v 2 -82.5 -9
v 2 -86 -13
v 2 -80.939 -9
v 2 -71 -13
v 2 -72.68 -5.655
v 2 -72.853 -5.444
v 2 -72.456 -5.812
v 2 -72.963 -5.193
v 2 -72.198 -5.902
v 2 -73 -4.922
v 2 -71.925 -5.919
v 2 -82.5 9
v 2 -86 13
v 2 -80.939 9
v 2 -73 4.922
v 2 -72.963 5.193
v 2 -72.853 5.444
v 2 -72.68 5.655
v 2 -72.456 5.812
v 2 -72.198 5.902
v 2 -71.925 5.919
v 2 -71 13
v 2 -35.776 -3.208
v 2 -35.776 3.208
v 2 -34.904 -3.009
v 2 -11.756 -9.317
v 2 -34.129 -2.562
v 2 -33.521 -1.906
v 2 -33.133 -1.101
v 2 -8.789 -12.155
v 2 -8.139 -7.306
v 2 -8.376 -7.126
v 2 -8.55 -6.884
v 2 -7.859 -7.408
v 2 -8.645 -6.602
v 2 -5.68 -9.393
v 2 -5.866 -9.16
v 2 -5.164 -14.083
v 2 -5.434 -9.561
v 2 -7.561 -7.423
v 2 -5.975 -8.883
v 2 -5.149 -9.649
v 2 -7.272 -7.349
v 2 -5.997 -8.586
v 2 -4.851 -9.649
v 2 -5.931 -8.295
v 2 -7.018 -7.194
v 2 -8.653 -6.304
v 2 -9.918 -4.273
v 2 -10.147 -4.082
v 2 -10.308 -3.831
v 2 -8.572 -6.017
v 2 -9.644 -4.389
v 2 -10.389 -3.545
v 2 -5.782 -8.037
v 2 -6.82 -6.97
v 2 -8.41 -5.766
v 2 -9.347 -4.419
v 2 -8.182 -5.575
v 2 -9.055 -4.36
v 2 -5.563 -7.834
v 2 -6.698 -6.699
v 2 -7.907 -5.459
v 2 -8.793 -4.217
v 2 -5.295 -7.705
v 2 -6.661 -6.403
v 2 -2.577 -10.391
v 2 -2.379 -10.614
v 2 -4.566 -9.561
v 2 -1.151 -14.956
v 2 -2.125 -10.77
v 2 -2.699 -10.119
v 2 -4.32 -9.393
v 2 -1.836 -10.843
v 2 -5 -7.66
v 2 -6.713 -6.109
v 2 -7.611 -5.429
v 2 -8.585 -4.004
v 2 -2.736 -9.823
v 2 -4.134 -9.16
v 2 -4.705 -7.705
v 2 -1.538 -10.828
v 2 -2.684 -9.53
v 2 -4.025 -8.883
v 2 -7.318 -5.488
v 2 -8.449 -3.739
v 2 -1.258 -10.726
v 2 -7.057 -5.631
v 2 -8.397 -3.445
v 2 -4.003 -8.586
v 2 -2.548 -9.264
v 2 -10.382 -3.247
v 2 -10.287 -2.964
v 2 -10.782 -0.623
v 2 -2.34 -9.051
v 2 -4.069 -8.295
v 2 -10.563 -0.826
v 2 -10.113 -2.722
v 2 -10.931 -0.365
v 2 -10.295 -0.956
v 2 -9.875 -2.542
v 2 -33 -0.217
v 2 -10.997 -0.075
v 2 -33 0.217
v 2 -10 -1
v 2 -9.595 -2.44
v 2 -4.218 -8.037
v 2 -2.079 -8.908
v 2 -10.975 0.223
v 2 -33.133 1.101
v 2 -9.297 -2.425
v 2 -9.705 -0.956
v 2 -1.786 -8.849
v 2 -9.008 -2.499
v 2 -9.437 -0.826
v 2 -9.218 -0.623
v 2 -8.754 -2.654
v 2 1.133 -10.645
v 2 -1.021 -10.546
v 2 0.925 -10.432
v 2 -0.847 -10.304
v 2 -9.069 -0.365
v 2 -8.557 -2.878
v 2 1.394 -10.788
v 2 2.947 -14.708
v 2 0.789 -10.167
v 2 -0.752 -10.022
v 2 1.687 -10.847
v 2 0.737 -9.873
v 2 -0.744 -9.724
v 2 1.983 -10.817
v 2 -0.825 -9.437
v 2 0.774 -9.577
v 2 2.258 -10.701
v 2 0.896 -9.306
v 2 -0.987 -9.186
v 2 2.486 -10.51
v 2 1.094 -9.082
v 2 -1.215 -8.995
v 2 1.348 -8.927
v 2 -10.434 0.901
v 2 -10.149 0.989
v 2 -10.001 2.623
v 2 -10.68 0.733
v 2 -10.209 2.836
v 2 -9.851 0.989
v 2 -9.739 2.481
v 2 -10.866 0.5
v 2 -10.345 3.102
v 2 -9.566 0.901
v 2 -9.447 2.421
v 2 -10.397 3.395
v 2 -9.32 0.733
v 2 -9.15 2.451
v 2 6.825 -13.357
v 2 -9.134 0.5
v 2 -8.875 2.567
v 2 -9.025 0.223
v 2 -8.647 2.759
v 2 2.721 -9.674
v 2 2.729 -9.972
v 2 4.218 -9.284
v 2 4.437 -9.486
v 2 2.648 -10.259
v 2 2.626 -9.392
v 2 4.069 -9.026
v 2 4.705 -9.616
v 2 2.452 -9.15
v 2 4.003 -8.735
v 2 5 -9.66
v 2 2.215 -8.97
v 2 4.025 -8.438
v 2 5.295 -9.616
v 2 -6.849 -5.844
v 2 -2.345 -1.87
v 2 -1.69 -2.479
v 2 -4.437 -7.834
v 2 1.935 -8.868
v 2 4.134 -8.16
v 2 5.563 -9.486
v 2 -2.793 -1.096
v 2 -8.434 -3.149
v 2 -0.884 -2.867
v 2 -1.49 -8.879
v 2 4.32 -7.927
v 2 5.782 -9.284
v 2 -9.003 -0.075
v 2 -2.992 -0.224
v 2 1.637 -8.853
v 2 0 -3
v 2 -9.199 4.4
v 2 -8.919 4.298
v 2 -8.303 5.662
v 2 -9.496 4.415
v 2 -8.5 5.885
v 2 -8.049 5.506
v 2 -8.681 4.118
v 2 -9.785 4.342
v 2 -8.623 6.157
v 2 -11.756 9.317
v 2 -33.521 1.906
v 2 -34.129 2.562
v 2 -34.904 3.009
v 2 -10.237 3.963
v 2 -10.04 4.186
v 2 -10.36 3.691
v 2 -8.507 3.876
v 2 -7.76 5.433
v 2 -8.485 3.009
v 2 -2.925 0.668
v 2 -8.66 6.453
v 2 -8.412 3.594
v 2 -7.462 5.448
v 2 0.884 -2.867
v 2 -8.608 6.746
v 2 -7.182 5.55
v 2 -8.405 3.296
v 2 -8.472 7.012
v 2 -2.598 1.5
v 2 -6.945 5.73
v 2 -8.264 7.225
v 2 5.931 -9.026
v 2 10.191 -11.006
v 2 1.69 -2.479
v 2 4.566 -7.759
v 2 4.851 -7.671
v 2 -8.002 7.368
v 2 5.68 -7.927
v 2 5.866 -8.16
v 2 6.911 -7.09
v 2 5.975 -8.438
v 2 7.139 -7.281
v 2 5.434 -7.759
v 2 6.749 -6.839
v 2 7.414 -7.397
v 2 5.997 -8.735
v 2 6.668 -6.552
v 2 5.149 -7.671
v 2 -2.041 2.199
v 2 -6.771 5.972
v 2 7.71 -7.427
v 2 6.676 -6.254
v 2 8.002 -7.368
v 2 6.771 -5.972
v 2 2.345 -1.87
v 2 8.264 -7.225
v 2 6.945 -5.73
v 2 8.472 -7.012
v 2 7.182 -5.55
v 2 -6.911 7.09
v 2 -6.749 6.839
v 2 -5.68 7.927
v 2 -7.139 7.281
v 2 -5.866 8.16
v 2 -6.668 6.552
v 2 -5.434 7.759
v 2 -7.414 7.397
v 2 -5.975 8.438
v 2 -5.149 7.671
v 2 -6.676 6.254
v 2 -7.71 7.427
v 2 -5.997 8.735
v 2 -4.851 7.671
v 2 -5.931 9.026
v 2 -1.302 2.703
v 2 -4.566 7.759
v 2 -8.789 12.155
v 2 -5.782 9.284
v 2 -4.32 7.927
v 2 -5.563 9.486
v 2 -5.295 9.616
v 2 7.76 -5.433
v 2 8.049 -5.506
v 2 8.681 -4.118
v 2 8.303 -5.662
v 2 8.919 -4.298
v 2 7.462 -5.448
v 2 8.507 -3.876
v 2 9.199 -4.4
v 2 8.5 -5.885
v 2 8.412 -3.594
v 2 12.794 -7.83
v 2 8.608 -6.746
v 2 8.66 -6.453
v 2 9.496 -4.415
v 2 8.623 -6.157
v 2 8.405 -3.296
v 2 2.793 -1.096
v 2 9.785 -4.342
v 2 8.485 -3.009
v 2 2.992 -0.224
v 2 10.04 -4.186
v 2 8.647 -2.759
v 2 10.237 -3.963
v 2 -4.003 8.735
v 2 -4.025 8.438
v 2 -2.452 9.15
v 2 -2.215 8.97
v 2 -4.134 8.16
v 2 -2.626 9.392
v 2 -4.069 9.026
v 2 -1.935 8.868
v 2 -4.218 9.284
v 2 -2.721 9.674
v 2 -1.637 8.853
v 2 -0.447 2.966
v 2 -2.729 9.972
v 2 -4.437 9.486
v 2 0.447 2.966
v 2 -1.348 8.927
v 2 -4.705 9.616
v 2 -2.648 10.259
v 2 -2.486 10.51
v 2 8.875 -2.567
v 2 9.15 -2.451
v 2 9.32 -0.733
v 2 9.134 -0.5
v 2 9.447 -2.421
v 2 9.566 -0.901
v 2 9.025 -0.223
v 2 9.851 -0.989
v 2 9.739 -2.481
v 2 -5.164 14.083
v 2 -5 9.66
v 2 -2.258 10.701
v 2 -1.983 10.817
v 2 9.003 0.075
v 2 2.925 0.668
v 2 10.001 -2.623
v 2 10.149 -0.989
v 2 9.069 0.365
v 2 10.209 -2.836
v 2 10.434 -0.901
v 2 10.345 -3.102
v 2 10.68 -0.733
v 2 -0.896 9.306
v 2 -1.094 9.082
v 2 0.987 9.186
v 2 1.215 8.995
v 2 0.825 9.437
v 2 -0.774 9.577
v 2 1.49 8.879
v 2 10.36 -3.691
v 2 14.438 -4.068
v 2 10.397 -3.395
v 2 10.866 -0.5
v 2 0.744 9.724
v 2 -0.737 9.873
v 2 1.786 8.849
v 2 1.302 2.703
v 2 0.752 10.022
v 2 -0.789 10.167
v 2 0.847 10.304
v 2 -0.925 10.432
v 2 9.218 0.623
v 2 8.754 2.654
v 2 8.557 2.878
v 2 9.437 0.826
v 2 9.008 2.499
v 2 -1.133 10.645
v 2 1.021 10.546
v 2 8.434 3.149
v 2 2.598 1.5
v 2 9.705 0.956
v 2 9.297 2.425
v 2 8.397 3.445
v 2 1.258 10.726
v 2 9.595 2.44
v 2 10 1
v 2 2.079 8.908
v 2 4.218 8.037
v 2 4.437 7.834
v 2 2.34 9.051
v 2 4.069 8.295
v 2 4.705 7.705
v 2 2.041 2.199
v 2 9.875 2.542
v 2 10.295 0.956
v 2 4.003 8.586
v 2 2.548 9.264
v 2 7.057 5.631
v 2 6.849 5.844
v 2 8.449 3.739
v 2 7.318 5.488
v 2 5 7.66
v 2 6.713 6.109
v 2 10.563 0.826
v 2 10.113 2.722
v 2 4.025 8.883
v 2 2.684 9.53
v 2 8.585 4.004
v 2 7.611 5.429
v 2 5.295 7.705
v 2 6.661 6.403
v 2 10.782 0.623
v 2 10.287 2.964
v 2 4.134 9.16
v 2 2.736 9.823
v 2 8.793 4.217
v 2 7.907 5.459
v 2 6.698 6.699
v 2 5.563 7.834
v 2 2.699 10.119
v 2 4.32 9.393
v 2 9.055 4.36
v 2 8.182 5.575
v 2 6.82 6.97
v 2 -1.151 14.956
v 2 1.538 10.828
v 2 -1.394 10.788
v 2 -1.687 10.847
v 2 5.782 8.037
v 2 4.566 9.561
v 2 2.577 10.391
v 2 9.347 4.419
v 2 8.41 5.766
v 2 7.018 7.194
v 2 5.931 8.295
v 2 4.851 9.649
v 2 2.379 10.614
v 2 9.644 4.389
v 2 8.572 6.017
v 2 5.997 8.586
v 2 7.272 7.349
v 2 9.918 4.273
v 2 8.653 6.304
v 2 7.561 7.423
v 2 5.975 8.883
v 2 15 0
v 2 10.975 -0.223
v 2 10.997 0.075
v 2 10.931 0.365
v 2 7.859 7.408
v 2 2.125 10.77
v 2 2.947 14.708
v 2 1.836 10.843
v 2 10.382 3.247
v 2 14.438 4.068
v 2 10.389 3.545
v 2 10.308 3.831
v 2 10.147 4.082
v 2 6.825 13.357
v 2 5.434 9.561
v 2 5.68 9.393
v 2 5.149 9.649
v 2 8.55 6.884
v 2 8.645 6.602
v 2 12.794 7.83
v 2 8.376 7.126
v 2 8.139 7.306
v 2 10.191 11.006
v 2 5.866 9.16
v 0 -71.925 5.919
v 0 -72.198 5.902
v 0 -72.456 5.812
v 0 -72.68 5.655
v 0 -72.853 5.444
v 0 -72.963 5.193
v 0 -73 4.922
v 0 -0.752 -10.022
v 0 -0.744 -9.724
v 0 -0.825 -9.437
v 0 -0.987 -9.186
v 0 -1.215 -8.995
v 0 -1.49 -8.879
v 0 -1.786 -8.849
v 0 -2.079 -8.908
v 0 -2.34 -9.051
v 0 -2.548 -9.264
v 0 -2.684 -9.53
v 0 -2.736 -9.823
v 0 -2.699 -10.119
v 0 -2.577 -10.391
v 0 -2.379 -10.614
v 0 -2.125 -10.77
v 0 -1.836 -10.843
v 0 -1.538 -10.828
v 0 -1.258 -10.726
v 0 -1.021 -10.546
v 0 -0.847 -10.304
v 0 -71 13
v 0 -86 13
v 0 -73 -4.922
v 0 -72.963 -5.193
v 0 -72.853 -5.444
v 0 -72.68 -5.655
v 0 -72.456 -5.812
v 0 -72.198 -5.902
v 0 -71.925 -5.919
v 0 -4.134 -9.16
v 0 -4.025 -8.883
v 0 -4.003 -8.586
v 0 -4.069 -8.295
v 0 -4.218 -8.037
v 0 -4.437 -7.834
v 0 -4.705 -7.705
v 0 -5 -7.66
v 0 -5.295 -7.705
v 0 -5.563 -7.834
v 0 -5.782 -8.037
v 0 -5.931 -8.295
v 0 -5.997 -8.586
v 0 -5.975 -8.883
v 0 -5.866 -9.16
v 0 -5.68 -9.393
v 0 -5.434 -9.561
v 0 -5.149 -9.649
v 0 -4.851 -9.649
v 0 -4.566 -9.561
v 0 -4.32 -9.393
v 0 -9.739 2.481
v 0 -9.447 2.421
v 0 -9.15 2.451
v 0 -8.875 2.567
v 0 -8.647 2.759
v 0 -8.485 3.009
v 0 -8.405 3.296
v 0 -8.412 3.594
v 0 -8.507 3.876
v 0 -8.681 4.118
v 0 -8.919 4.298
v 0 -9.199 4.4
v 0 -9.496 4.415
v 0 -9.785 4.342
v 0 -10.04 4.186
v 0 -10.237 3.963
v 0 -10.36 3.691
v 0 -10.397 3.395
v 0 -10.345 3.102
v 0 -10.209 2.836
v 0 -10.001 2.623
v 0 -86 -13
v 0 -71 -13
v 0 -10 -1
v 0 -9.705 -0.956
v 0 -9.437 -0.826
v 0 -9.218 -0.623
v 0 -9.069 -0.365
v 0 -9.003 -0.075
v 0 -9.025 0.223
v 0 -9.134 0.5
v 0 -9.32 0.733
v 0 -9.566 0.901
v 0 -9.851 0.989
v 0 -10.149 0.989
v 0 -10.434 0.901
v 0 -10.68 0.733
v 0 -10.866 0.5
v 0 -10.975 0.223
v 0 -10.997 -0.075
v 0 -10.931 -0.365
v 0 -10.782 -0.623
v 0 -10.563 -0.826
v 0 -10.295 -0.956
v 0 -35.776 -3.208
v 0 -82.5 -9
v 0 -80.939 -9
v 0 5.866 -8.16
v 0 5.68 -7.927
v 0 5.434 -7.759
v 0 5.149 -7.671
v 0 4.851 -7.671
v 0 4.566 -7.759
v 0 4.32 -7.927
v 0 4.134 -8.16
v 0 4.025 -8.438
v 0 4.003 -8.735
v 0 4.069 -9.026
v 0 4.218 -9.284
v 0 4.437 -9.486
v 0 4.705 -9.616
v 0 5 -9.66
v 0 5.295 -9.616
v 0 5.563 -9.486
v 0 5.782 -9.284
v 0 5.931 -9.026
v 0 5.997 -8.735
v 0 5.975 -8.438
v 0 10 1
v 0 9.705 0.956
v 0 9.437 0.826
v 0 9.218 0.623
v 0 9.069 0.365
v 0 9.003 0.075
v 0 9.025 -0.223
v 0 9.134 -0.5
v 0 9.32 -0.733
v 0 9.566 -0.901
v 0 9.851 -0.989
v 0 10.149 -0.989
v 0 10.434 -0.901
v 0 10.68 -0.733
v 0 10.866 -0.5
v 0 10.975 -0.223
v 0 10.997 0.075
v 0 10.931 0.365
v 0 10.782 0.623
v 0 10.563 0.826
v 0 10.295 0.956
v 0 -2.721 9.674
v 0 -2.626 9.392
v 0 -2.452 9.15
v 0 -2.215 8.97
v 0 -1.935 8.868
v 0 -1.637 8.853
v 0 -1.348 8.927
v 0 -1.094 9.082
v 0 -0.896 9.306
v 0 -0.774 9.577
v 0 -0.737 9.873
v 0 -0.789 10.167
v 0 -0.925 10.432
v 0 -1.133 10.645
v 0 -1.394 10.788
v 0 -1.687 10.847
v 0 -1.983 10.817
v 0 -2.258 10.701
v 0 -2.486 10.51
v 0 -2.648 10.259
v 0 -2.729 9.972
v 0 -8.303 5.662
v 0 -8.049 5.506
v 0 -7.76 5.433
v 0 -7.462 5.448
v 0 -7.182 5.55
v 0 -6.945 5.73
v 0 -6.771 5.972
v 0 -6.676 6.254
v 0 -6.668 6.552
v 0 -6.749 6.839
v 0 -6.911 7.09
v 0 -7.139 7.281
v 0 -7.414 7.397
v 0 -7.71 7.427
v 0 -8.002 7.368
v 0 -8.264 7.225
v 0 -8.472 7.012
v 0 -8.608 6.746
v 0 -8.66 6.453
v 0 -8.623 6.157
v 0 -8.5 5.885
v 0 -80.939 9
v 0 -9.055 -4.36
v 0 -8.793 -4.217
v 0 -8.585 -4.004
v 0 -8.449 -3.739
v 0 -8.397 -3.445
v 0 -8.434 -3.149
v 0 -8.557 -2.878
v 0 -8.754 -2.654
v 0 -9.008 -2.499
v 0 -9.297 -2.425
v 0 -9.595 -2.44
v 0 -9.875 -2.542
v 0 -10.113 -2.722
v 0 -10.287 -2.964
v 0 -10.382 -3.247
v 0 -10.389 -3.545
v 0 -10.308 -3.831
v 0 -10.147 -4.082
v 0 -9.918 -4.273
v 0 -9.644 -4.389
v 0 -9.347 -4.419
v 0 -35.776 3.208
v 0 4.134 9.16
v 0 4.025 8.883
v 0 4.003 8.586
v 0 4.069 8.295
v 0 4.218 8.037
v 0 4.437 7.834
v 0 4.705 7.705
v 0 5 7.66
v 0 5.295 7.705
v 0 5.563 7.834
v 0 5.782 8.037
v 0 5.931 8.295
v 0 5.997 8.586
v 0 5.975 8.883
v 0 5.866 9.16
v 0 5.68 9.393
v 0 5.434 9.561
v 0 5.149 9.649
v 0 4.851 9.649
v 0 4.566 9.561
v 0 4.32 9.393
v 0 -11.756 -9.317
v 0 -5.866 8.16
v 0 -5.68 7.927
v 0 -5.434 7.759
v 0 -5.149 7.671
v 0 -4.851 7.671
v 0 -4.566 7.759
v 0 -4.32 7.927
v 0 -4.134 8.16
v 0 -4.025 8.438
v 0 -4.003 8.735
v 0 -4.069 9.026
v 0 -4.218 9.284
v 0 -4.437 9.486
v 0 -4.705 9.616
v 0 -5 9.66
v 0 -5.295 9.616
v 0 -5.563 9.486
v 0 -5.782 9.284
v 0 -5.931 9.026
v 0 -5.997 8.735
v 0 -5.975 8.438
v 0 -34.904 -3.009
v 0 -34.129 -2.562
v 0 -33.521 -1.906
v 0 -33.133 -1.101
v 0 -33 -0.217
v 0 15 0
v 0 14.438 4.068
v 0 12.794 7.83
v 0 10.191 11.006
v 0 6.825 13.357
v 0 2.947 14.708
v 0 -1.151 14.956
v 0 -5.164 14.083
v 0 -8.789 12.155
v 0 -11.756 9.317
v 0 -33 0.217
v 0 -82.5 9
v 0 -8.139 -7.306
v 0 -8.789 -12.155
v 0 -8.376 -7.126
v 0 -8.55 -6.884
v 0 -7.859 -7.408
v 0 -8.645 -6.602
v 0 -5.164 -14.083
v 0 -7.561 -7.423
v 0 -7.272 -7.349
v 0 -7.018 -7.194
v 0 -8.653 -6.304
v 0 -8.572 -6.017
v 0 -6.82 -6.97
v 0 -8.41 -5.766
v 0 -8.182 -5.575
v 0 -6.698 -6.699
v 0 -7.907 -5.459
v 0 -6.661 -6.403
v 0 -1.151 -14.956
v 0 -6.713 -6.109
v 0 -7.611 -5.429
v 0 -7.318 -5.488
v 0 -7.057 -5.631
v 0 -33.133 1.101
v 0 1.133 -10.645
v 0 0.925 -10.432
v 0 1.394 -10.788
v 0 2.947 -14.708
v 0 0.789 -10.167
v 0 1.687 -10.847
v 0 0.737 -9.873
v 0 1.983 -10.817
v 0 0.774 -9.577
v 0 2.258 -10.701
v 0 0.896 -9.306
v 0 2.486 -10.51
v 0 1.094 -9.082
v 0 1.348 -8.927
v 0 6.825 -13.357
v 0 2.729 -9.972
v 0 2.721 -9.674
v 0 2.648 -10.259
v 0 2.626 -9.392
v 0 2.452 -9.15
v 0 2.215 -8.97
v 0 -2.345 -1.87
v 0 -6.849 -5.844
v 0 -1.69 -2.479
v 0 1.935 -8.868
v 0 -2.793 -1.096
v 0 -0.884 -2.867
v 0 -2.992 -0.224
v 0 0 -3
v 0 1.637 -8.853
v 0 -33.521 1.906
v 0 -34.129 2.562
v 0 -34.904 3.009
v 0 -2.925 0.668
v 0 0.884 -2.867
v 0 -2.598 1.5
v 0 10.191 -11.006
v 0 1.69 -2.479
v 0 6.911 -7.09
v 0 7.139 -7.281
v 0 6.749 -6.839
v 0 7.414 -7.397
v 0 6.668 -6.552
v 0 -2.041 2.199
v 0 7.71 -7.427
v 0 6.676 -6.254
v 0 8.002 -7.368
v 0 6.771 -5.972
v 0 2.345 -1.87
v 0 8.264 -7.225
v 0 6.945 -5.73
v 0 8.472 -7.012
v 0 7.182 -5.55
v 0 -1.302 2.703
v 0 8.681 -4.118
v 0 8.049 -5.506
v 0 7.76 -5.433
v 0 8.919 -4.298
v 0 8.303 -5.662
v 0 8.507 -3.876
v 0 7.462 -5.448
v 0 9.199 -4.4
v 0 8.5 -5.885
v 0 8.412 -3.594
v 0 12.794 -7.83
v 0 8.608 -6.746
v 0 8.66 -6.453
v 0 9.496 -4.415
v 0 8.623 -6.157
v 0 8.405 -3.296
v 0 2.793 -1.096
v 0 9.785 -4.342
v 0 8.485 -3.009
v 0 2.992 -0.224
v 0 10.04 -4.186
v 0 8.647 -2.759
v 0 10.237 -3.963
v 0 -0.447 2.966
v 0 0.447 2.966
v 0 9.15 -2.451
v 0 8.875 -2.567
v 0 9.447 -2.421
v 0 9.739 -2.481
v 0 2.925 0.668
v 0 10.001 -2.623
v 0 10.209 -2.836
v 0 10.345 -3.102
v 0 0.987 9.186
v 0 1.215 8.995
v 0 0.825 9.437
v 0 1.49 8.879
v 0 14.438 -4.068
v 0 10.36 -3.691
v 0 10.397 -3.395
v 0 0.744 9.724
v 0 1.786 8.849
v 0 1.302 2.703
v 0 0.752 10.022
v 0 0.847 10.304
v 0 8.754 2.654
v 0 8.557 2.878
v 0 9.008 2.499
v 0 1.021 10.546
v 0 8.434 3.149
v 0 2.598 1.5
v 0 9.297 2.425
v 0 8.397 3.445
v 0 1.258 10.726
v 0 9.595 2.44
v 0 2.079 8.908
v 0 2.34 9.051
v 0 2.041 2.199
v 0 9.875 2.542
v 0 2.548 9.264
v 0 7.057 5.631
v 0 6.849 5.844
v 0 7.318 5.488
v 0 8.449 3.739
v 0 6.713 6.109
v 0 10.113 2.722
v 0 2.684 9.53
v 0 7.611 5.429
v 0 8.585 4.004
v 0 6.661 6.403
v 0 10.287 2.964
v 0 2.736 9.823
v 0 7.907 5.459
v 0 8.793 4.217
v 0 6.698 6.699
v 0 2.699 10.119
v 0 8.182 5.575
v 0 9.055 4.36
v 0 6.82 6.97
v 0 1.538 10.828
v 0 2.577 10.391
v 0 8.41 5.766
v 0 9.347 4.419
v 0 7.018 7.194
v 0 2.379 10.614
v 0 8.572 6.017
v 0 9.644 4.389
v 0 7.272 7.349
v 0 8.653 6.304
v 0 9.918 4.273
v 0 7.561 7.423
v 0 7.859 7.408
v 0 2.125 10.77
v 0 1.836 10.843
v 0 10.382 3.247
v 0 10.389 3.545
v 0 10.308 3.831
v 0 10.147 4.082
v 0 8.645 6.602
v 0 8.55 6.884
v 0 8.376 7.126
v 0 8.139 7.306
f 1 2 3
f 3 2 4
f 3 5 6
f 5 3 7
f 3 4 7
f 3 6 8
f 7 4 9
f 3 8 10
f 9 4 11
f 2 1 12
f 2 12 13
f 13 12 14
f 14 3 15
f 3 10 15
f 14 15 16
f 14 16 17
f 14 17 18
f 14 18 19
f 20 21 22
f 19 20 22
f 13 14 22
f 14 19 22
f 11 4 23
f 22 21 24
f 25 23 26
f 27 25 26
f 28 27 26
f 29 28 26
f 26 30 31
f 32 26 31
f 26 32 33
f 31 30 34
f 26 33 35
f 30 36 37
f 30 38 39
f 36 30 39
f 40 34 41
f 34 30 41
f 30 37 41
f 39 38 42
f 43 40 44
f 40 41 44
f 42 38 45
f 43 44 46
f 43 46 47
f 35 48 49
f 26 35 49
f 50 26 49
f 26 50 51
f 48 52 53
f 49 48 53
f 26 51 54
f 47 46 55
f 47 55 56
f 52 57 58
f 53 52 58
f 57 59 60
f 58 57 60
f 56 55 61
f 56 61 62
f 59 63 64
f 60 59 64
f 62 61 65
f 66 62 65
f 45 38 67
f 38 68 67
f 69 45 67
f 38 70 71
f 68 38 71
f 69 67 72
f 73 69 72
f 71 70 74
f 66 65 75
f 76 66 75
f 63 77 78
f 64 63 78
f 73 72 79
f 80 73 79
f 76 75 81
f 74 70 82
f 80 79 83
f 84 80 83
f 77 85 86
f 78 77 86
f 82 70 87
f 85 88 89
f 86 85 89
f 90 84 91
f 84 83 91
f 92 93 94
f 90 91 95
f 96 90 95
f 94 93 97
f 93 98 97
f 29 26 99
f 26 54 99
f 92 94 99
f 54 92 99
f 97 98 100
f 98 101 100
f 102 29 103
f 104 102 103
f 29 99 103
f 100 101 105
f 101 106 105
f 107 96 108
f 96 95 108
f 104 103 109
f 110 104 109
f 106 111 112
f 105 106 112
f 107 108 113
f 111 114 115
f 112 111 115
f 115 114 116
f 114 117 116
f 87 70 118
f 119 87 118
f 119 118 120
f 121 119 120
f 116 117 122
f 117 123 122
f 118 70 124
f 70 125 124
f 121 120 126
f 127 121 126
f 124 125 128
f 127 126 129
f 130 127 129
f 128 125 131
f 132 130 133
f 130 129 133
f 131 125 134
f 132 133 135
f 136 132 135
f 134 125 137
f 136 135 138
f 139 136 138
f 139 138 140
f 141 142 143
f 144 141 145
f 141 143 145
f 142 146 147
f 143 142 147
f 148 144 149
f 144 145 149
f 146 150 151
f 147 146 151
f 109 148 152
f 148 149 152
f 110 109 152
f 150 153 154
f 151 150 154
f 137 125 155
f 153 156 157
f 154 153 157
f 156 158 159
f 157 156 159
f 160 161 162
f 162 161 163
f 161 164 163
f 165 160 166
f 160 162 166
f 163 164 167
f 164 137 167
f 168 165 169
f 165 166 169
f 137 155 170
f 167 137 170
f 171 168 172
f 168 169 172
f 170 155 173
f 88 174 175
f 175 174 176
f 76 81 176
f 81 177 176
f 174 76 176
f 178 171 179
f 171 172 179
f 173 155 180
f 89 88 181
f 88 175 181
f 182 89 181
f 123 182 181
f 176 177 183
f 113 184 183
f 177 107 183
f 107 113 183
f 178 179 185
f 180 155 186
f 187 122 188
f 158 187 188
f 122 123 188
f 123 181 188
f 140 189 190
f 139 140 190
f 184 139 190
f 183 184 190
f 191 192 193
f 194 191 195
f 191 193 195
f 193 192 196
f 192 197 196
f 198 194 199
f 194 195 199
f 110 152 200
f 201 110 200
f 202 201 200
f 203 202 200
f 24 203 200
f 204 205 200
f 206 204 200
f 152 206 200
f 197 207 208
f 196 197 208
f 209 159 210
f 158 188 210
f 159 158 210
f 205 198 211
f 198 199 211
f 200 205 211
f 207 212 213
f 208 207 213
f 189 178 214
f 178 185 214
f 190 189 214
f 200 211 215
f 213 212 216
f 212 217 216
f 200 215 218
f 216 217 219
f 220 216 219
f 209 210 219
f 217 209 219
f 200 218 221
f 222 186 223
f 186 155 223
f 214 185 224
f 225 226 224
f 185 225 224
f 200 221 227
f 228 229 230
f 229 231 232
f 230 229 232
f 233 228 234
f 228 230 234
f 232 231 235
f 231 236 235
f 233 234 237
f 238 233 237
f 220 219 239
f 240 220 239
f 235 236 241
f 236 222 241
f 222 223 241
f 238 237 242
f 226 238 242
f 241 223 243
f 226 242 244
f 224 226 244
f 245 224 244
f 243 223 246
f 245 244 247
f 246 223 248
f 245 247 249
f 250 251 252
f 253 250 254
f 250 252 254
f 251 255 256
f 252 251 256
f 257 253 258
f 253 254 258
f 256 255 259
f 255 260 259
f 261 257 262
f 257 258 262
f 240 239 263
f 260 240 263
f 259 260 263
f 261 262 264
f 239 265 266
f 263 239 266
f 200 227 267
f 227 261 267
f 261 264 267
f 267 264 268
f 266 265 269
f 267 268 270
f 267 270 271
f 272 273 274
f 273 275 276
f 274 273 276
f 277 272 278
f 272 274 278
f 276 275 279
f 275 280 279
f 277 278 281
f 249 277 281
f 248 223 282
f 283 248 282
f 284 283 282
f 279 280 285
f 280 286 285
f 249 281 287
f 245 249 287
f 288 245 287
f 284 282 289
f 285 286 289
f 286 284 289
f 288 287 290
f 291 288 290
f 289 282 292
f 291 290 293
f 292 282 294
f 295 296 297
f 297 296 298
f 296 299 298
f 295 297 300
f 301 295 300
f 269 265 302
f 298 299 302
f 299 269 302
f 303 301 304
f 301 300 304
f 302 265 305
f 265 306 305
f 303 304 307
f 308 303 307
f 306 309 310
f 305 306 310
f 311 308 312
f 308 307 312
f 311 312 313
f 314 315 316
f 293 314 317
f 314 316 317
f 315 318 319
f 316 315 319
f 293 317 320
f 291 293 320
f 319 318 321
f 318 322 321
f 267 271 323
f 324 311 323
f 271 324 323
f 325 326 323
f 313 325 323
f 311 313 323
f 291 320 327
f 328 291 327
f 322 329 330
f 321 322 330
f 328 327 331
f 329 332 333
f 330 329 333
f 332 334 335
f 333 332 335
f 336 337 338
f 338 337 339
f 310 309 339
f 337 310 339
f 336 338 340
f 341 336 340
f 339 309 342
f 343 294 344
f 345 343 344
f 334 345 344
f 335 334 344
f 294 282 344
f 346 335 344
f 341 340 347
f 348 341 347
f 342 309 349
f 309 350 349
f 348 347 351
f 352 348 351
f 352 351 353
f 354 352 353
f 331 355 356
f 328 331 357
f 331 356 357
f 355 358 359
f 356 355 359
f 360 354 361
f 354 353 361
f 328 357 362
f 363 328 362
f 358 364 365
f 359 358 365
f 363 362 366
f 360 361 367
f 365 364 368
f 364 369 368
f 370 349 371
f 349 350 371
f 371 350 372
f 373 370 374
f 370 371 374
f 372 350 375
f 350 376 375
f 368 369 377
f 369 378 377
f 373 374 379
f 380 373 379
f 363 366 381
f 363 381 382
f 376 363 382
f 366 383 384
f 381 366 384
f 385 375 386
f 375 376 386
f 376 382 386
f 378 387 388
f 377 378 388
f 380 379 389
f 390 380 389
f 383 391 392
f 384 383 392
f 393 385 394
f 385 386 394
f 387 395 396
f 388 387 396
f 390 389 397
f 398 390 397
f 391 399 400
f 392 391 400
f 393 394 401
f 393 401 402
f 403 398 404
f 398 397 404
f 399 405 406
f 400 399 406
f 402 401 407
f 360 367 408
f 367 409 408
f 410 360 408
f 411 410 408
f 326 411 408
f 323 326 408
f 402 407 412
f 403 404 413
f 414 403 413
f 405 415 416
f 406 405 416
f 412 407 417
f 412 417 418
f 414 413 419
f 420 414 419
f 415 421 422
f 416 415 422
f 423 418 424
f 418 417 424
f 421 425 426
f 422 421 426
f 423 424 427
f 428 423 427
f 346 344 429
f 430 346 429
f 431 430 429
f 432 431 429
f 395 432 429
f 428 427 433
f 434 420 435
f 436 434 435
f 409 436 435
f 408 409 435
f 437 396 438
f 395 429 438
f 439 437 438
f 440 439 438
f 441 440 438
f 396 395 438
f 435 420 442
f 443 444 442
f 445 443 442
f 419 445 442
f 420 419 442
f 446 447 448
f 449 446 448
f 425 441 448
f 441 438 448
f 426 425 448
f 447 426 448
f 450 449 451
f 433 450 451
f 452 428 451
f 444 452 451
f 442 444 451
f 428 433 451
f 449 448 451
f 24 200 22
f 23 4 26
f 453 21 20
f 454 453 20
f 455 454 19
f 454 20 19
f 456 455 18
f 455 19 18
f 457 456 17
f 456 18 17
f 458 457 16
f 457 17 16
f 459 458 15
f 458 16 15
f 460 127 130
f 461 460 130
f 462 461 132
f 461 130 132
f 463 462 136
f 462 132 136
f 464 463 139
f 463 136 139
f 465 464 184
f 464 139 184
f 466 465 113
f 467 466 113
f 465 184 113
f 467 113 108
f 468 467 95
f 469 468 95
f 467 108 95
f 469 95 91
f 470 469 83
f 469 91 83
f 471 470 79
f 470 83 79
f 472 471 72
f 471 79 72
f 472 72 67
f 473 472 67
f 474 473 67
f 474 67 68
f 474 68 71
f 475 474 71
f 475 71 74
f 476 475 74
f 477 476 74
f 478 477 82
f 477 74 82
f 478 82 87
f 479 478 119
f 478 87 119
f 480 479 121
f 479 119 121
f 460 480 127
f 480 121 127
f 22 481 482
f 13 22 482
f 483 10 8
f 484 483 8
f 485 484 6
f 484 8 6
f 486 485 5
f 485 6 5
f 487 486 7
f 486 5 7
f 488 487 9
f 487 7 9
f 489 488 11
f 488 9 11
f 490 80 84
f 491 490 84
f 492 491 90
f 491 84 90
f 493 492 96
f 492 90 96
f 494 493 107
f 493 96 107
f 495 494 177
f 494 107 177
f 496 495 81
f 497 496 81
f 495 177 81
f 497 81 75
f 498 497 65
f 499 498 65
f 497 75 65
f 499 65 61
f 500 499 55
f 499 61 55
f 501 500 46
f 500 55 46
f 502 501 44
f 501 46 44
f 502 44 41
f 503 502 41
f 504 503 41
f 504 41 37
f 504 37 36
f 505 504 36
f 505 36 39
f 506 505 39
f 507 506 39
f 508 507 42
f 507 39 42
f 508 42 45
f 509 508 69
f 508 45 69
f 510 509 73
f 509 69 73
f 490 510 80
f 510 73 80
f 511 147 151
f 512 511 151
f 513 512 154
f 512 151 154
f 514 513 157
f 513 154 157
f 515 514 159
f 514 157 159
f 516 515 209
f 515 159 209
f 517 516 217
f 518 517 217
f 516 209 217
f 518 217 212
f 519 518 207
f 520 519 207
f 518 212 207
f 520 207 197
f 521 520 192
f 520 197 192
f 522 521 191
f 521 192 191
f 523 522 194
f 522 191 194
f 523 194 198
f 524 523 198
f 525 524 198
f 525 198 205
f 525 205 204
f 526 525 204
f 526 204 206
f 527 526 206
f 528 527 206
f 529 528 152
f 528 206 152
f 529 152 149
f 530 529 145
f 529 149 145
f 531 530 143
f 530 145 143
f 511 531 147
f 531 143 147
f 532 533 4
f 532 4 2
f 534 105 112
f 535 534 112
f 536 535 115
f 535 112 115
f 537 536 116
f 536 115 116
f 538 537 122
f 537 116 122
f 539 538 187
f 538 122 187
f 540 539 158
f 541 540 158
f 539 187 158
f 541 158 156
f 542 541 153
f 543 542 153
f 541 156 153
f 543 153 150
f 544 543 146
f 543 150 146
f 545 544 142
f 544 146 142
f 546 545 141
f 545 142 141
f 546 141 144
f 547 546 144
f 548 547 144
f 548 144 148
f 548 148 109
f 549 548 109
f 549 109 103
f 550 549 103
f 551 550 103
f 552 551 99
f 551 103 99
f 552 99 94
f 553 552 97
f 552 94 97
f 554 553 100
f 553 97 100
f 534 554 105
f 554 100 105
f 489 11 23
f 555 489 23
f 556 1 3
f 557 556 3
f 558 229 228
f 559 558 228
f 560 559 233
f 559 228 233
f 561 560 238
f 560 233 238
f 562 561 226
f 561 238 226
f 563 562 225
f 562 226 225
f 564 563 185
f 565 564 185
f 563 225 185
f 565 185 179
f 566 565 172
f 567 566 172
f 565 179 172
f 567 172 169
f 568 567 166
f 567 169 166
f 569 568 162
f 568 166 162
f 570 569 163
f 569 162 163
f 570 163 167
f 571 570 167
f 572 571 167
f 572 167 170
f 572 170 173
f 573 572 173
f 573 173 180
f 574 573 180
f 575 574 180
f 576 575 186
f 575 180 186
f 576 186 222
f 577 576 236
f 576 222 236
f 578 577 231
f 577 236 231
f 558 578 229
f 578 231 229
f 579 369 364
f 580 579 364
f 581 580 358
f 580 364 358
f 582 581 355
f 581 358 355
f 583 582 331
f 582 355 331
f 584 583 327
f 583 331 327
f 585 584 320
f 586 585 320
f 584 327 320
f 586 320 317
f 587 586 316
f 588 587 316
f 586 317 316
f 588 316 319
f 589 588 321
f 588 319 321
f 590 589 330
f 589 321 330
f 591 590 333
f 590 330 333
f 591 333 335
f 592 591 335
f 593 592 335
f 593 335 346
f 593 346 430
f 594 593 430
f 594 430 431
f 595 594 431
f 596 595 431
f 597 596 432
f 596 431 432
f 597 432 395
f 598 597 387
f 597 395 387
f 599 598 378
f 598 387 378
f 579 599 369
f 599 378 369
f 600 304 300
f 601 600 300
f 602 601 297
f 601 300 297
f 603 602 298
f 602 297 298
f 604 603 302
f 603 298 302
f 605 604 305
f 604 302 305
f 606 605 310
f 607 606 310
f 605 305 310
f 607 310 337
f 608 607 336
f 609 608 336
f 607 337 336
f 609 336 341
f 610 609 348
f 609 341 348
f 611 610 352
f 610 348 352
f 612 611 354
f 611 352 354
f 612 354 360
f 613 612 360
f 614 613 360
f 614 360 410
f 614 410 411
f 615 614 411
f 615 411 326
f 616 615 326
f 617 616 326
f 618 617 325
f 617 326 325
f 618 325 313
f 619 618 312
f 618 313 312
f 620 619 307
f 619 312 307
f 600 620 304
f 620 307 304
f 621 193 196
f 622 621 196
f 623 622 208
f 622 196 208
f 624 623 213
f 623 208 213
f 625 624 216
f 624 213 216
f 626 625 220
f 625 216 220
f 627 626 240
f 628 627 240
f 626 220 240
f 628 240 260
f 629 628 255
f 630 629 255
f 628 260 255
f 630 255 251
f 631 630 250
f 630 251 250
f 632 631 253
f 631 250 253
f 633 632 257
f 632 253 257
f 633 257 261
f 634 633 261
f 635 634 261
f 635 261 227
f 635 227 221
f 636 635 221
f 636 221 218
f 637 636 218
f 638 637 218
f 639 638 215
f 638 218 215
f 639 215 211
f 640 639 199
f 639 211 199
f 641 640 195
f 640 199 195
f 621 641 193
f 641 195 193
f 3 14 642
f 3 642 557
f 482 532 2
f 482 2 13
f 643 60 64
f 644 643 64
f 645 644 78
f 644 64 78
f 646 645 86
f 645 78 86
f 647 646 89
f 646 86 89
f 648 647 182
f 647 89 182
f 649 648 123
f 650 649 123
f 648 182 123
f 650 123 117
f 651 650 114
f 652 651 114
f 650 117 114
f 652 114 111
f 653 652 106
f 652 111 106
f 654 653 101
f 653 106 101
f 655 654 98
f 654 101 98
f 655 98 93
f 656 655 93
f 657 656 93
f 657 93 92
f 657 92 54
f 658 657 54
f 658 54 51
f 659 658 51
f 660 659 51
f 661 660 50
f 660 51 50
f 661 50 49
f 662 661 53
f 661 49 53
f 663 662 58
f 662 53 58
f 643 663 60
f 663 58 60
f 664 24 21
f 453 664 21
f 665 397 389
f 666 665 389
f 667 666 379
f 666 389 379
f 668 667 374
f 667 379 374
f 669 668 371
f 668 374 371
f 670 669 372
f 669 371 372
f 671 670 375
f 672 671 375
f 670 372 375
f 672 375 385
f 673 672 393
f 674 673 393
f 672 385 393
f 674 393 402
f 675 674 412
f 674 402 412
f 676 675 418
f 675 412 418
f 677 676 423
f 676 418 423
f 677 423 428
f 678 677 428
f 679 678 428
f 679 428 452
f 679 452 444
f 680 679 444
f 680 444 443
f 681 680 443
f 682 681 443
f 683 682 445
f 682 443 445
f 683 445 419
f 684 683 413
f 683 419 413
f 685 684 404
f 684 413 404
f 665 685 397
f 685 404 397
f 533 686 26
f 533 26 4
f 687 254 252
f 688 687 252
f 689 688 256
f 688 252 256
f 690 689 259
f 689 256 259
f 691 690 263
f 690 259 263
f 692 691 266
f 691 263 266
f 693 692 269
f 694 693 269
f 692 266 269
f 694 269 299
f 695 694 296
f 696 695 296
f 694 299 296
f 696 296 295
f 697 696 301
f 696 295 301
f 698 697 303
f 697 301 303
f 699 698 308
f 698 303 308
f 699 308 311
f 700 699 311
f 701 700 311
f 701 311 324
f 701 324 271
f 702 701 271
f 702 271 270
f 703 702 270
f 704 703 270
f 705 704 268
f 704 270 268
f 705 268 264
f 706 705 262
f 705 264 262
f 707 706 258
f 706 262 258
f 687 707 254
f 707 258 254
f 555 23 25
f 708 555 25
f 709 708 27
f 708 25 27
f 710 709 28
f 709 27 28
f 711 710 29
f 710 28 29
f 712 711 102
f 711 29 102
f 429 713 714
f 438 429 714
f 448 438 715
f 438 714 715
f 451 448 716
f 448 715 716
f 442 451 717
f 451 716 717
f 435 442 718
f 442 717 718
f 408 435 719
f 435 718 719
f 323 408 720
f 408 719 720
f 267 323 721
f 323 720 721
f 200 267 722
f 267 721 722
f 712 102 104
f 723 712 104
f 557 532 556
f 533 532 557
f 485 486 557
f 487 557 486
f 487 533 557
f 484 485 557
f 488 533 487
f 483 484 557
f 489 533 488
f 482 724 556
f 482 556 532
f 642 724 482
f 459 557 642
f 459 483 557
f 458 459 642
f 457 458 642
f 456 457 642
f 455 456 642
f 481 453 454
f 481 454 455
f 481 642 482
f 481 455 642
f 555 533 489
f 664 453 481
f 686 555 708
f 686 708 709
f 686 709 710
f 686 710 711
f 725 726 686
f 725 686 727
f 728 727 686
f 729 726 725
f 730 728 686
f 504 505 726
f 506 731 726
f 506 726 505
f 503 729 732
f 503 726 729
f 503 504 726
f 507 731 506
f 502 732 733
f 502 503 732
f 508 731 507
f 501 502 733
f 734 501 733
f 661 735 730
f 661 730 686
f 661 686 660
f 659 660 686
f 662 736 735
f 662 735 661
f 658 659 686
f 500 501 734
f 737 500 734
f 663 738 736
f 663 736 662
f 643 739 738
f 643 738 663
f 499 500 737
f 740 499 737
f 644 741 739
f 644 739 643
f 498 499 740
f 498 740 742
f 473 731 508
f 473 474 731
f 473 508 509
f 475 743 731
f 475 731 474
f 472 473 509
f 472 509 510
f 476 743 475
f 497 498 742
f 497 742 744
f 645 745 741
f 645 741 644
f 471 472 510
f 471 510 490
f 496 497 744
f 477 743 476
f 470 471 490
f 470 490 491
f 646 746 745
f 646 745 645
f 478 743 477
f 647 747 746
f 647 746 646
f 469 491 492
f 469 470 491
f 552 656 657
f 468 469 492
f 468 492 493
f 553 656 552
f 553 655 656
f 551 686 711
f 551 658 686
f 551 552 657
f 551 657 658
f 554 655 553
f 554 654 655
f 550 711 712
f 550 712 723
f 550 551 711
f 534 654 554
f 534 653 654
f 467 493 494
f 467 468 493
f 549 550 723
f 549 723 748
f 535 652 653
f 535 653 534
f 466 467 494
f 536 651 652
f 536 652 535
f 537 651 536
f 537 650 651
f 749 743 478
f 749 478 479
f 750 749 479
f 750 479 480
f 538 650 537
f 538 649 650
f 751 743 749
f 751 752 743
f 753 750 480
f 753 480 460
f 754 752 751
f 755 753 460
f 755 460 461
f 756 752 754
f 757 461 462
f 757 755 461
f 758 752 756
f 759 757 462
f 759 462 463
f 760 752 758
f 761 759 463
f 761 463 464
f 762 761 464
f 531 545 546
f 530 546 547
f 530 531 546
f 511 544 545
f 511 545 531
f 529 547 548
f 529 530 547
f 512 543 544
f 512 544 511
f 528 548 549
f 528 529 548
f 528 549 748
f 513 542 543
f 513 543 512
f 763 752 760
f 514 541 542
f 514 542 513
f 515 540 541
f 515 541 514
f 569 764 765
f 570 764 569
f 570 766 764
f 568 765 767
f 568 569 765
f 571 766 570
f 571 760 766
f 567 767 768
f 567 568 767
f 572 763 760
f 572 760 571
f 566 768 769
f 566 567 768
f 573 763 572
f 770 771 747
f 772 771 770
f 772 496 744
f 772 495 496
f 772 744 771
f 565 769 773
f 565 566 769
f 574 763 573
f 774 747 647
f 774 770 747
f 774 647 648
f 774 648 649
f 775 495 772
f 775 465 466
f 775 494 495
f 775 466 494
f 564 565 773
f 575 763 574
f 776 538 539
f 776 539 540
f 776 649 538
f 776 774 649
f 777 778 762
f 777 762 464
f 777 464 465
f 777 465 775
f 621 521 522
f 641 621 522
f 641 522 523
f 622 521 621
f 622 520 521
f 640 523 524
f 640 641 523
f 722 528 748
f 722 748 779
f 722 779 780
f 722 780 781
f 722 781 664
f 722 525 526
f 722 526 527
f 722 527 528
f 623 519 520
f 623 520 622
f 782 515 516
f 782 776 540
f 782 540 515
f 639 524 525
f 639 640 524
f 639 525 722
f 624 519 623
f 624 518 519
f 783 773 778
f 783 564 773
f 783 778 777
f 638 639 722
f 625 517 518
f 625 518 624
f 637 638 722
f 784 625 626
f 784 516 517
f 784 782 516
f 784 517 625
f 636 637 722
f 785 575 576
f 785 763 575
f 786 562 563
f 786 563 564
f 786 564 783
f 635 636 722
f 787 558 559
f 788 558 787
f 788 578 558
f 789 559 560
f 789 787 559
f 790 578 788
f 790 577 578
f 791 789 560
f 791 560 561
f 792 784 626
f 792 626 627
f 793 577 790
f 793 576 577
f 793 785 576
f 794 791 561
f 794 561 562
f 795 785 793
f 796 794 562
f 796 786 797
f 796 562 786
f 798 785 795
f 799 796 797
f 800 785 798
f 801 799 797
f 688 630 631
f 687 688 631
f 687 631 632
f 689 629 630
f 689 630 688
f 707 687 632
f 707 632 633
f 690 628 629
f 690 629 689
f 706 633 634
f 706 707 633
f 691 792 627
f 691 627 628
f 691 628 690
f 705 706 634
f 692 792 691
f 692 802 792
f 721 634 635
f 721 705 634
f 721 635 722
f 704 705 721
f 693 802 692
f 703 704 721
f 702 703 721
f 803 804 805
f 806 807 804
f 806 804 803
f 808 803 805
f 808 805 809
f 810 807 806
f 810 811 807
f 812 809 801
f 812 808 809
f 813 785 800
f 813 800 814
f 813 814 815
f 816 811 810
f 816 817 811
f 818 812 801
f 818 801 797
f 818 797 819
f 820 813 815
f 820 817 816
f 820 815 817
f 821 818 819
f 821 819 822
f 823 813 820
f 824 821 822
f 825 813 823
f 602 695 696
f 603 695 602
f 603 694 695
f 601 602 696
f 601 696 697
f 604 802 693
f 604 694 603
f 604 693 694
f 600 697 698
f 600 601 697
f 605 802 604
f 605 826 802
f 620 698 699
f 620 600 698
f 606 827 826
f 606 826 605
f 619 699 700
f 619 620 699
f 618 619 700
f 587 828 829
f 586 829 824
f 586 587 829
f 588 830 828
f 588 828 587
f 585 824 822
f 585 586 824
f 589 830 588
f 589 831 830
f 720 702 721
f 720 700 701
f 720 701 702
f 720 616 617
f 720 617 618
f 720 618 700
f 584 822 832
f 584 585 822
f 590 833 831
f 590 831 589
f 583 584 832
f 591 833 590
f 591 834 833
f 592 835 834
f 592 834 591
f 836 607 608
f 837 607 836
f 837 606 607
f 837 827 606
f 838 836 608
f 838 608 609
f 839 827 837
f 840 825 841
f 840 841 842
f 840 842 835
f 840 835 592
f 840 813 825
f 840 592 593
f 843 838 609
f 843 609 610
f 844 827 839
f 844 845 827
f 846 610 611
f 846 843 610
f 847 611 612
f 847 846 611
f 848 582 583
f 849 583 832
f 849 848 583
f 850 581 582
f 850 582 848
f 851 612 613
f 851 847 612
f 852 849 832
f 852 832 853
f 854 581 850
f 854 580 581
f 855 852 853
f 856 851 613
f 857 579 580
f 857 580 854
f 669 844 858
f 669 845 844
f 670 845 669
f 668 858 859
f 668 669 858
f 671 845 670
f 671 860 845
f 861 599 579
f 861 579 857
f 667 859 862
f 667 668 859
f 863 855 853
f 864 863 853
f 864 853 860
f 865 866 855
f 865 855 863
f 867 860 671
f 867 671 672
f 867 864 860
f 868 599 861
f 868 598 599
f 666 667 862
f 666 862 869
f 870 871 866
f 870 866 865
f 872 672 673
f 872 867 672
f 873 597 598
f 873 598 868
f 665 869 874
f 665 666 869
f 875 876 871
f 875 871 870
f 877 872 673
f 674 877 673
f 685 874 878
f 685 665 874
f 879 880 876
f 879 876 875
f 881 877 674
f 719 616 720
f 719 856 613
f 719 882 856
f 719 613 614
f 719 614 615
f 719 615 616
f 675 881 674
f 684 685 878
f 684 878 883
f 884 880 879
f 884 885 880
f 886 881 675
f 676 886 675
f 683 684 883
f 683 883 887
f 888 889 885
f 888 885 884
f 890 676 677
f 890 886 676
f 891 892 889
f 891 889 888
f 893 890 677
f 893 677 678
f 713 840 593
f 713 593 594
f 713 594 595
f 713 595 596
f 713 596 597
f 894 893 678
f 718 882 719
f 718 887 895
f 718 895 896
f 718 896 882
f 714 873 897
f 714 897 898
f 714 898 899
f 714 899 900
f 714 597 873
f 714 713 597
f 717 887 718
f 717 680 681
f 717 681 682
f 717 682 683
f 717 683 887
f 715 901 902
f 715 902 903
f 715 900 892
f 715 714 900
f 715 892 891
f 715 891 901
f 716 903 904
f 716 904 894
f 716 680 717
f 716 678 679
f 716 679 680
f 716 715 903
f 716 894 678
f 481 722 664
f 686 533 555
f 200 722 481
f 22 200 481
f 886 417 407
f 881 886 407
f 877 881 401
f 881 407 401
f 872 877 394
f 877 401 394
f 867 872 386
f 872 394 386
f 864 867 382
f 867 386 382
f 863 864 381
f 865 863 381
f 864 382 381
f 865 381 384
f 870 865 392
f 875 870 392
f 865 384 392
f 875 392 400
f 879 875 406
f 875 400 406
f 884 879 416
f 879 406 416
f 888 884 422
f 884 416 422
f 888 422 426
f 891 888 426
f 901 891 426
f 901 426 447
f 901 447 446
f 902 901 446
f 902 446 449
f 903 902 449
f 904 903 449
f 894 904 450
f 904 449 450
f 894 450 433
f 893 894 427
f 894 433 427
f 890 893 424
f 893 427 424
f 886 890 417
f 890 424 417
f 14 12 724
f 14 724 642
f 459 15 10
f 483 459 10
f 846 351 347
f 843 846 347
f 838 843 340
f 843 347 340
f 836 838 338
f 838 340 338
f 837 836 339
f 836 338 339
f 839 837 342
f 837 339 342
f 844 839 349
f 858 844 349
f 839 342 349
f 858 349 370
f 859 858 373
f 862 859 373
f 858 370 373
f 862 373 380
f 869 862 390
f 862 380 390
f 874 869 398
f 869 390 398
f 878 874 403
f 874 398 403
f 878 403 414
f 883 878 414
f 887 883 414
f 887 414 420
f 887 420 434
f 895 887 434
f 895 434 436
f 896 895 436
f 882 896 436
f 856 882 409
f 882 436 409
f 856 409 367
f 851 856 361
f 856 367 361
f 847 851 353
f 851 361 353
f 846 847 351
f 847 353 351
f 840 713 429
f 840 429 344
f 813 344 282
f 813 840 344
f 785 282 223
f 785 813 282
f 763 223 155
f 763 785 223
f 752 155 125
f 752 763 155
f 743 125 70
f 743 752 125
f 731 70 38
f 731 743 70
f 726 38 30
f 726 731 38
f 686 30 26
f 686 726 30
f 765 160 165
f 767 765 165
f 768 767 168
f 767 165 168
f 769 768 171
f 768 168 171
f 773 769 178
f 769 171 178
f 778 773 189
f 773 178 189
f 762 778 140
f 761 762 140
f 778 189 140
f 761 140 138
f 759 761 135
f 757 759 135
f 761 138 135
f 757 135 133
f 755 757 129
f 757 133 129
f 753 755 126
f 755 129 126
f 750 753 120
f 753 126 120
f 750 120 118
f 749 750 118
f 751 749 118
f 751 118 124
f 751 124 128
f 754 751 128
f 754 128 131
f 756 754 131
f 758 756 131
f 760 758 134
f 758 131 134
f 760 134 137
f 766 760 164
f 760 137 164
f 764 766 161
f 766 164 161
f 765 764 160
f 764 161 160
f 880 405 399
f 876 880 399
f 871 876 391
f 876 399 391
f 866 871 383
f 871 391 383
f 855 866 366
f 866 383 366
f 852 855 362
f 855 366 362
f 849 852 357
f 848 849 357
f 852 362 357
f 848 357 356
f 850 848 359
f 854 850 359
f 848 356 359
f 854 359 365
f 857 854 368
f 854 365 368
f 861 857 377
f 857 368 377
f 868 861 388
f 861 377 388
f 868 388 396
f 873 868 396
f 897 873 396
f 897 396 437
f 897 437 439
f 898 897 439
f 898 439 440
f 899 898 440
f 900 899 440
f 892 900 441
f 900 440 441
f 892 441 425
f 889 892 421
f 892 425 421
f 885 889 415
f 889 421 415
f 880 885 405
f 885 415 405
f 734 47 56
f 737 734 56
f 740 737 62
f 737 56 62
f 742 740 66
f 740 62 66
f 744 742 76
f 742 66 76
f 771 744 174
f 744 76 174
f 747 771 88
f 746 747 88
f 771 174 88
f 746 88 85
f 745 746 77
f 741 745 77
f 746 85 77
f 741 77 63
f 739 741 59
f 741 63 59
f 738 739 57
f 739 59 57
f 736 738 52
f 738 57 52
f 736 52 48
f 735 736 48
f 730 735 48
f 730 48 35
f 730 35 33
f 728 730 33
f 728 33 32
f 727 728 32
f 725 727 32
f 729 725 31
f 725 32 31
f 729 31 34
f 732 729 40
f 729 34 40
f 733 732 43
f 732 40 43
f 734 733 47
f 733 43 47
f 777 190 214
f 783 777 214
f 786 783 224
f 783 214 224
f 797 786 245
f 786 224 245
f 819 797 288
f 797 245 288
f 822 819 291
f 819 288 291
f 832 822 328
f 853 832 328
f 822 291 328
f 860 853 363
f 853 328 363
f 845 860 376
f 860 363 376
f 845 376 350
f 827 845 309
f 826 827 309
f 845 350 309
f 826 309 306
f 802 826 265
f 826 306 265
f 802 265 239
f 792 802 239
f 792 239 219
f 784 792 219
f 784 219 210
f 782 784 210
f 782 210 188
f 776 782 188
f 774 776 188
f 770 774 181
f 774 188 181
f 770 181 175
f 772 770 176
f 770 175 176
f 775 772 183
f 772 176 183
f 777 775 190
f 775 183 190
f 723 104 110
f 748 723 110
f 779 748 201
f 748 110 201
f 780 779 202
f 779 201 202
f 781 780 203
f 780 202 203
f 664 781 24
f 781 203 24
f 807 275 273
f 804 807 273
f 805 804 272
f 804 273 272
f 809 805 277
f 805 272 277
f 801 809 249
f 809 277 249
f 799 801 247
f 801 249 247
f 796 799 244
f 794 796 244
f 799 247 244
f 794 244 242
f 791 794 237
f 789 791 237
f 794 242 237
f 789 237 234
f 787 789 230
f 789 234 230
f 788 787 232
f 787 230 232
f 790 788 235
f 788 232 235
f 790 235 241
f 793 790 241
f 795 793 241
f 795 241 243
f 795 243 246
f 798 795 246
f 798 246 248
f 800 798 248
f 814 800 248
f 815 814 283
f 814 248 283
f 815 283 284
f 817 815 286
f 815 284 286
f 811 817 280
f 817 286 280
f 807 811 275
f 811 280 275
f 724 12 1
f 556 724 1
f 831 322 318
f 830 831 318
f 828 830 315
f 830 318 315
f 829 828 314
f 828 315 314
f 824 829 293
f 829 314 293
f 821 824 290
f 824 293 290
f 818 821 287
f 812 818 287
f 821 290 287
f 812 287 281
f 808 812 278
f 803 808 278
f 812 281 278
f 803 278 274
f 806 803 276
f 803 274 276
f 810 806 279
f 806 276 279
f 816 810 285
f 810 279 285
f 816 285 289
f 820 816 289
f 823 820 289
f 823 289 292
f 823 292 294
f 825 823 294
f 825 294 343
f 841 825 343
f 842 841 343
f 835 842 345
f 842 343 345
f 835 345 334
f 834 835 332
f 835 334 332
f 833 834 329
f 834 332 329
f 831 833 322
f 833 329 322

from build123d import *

# Parameters (mm, degrees)
RESSALTO_EXTRUS_O1_DEPTH = 2
ESBO_O2_R                = 3
ESBO_O2_R_2              = 1
CORTE_EXTRUS_O1_DEPTH    = 2
PADR_OCIRCULAR1_COUNT    = 18
ESBO_O3_W                = 18
ESBO_O3_H                = 1.561418551
CORTE_EXTRUS_O2_DEPTH    = 2


with BuildPart() as part:
    # Esboço1 → Ressalto-extrusão1 (new body)
    with BuildSketch(Plane(origin=(0, 0, 0), x_dir=(0, 0, -1), z_dir=(1, 0, 0))):
        with BuildLine():
            Line((-13, -71), (-13, -86))
            Line((-13, -86), (0, -86))
            Line((0, -86), (0, 15))
            ThreePointArc((0, 15), (-14.165790836, 4.932582487), (-9.316524238, -11.755950669))
            add(Edge.make_bspline(
                [(-9.316524238, -11.755950669), (-13, -71)],
                knots=[0, 0, 1, 1], degree=1))
        make_face()
    ressalto_extrus_o1 = extrude(amount=RESSALTO_EXTRUS_O1_DEPTH)

    # Espelhar1: Ressalto-extrusão1 across plane
    add(ressalto_extrus_o1.mirror(Plane(origin=(2, 15, 0), x_dir=(1, 0, 0), z_dir=(0, 0, 1))))

    # Esboço2 → Corte-extrusão1 (cut)
    with BuildSketch(Plane(origin=(2, 0, 0), x_dir=(0, 0, -1), z_dir=(1, 0, 0))):
        Circle(ESBO_O2_R)
        with Locations((0, -10)):
            Circle(ESBO_O2_R_2)
    corte_extrus_o1 = extrude(amount=-CORTE_EXTRUS_O1_DEPTH, mode=Mode.SUBTRACT)

    # PadrãoCircular1: Corte-extrusão1 ×18 about axis
    padr_ocircular1_axis = Axis((0, 0, 0), (1, 0, 0))
    for i in range(1, PADR_OCIRCULAR1_COUNT):
        add(corte_extrus_o1.rotate(padr_ocircular1_axis, i * 360 / PADR_OCIRCULAR1_COUNT), mode=Mode.SUBTRACT)

    # Esboço3 → Corte-extrusão2 (cut)
    with BuildSketch(Plane(origin=(2, 0, 0), x_dir=(0, 0, -1), z_dir=(1, 0, 0))):
        with BuildLine():
            Line((-4.922191444, -73), (4.922191444, -73))
            ThreePointArc((4.922191444, -73), (5.655263728, -72.680150738), (5.919390754, -71.925210052))
            Line((5.919390754, -71.925210052), (3.208172262, -35.775630155))
            ThreePointArc((3.208172262, -35.775630155), (2.257026545, -33.800783147), (0.216574332, -33))
            Line((0.216574332, -33), (-0.216574332, -33))
            ThreePointArc((-0.216574332, -33), (-2.257026545, -33.800783147), (-3.208172262, -35.775630155))
            Line((-3.208172262, -35.775630155), (-5.919390754, -71.925210052))
            ThreePointArc((-5.919390754, -71.925210052), (-5.655263728, -72.680150738), (-4.922191444, -73))
        make_face()
        with Locations((0, -81.719290725)):
            Rectangle(ESBO_O3_W, ESBO_O3_H)
    extrude(amount=-CORTE_EXTRUS_O2_DEPTH, mode=Mode.SUBTRACT)


solid = part.part
